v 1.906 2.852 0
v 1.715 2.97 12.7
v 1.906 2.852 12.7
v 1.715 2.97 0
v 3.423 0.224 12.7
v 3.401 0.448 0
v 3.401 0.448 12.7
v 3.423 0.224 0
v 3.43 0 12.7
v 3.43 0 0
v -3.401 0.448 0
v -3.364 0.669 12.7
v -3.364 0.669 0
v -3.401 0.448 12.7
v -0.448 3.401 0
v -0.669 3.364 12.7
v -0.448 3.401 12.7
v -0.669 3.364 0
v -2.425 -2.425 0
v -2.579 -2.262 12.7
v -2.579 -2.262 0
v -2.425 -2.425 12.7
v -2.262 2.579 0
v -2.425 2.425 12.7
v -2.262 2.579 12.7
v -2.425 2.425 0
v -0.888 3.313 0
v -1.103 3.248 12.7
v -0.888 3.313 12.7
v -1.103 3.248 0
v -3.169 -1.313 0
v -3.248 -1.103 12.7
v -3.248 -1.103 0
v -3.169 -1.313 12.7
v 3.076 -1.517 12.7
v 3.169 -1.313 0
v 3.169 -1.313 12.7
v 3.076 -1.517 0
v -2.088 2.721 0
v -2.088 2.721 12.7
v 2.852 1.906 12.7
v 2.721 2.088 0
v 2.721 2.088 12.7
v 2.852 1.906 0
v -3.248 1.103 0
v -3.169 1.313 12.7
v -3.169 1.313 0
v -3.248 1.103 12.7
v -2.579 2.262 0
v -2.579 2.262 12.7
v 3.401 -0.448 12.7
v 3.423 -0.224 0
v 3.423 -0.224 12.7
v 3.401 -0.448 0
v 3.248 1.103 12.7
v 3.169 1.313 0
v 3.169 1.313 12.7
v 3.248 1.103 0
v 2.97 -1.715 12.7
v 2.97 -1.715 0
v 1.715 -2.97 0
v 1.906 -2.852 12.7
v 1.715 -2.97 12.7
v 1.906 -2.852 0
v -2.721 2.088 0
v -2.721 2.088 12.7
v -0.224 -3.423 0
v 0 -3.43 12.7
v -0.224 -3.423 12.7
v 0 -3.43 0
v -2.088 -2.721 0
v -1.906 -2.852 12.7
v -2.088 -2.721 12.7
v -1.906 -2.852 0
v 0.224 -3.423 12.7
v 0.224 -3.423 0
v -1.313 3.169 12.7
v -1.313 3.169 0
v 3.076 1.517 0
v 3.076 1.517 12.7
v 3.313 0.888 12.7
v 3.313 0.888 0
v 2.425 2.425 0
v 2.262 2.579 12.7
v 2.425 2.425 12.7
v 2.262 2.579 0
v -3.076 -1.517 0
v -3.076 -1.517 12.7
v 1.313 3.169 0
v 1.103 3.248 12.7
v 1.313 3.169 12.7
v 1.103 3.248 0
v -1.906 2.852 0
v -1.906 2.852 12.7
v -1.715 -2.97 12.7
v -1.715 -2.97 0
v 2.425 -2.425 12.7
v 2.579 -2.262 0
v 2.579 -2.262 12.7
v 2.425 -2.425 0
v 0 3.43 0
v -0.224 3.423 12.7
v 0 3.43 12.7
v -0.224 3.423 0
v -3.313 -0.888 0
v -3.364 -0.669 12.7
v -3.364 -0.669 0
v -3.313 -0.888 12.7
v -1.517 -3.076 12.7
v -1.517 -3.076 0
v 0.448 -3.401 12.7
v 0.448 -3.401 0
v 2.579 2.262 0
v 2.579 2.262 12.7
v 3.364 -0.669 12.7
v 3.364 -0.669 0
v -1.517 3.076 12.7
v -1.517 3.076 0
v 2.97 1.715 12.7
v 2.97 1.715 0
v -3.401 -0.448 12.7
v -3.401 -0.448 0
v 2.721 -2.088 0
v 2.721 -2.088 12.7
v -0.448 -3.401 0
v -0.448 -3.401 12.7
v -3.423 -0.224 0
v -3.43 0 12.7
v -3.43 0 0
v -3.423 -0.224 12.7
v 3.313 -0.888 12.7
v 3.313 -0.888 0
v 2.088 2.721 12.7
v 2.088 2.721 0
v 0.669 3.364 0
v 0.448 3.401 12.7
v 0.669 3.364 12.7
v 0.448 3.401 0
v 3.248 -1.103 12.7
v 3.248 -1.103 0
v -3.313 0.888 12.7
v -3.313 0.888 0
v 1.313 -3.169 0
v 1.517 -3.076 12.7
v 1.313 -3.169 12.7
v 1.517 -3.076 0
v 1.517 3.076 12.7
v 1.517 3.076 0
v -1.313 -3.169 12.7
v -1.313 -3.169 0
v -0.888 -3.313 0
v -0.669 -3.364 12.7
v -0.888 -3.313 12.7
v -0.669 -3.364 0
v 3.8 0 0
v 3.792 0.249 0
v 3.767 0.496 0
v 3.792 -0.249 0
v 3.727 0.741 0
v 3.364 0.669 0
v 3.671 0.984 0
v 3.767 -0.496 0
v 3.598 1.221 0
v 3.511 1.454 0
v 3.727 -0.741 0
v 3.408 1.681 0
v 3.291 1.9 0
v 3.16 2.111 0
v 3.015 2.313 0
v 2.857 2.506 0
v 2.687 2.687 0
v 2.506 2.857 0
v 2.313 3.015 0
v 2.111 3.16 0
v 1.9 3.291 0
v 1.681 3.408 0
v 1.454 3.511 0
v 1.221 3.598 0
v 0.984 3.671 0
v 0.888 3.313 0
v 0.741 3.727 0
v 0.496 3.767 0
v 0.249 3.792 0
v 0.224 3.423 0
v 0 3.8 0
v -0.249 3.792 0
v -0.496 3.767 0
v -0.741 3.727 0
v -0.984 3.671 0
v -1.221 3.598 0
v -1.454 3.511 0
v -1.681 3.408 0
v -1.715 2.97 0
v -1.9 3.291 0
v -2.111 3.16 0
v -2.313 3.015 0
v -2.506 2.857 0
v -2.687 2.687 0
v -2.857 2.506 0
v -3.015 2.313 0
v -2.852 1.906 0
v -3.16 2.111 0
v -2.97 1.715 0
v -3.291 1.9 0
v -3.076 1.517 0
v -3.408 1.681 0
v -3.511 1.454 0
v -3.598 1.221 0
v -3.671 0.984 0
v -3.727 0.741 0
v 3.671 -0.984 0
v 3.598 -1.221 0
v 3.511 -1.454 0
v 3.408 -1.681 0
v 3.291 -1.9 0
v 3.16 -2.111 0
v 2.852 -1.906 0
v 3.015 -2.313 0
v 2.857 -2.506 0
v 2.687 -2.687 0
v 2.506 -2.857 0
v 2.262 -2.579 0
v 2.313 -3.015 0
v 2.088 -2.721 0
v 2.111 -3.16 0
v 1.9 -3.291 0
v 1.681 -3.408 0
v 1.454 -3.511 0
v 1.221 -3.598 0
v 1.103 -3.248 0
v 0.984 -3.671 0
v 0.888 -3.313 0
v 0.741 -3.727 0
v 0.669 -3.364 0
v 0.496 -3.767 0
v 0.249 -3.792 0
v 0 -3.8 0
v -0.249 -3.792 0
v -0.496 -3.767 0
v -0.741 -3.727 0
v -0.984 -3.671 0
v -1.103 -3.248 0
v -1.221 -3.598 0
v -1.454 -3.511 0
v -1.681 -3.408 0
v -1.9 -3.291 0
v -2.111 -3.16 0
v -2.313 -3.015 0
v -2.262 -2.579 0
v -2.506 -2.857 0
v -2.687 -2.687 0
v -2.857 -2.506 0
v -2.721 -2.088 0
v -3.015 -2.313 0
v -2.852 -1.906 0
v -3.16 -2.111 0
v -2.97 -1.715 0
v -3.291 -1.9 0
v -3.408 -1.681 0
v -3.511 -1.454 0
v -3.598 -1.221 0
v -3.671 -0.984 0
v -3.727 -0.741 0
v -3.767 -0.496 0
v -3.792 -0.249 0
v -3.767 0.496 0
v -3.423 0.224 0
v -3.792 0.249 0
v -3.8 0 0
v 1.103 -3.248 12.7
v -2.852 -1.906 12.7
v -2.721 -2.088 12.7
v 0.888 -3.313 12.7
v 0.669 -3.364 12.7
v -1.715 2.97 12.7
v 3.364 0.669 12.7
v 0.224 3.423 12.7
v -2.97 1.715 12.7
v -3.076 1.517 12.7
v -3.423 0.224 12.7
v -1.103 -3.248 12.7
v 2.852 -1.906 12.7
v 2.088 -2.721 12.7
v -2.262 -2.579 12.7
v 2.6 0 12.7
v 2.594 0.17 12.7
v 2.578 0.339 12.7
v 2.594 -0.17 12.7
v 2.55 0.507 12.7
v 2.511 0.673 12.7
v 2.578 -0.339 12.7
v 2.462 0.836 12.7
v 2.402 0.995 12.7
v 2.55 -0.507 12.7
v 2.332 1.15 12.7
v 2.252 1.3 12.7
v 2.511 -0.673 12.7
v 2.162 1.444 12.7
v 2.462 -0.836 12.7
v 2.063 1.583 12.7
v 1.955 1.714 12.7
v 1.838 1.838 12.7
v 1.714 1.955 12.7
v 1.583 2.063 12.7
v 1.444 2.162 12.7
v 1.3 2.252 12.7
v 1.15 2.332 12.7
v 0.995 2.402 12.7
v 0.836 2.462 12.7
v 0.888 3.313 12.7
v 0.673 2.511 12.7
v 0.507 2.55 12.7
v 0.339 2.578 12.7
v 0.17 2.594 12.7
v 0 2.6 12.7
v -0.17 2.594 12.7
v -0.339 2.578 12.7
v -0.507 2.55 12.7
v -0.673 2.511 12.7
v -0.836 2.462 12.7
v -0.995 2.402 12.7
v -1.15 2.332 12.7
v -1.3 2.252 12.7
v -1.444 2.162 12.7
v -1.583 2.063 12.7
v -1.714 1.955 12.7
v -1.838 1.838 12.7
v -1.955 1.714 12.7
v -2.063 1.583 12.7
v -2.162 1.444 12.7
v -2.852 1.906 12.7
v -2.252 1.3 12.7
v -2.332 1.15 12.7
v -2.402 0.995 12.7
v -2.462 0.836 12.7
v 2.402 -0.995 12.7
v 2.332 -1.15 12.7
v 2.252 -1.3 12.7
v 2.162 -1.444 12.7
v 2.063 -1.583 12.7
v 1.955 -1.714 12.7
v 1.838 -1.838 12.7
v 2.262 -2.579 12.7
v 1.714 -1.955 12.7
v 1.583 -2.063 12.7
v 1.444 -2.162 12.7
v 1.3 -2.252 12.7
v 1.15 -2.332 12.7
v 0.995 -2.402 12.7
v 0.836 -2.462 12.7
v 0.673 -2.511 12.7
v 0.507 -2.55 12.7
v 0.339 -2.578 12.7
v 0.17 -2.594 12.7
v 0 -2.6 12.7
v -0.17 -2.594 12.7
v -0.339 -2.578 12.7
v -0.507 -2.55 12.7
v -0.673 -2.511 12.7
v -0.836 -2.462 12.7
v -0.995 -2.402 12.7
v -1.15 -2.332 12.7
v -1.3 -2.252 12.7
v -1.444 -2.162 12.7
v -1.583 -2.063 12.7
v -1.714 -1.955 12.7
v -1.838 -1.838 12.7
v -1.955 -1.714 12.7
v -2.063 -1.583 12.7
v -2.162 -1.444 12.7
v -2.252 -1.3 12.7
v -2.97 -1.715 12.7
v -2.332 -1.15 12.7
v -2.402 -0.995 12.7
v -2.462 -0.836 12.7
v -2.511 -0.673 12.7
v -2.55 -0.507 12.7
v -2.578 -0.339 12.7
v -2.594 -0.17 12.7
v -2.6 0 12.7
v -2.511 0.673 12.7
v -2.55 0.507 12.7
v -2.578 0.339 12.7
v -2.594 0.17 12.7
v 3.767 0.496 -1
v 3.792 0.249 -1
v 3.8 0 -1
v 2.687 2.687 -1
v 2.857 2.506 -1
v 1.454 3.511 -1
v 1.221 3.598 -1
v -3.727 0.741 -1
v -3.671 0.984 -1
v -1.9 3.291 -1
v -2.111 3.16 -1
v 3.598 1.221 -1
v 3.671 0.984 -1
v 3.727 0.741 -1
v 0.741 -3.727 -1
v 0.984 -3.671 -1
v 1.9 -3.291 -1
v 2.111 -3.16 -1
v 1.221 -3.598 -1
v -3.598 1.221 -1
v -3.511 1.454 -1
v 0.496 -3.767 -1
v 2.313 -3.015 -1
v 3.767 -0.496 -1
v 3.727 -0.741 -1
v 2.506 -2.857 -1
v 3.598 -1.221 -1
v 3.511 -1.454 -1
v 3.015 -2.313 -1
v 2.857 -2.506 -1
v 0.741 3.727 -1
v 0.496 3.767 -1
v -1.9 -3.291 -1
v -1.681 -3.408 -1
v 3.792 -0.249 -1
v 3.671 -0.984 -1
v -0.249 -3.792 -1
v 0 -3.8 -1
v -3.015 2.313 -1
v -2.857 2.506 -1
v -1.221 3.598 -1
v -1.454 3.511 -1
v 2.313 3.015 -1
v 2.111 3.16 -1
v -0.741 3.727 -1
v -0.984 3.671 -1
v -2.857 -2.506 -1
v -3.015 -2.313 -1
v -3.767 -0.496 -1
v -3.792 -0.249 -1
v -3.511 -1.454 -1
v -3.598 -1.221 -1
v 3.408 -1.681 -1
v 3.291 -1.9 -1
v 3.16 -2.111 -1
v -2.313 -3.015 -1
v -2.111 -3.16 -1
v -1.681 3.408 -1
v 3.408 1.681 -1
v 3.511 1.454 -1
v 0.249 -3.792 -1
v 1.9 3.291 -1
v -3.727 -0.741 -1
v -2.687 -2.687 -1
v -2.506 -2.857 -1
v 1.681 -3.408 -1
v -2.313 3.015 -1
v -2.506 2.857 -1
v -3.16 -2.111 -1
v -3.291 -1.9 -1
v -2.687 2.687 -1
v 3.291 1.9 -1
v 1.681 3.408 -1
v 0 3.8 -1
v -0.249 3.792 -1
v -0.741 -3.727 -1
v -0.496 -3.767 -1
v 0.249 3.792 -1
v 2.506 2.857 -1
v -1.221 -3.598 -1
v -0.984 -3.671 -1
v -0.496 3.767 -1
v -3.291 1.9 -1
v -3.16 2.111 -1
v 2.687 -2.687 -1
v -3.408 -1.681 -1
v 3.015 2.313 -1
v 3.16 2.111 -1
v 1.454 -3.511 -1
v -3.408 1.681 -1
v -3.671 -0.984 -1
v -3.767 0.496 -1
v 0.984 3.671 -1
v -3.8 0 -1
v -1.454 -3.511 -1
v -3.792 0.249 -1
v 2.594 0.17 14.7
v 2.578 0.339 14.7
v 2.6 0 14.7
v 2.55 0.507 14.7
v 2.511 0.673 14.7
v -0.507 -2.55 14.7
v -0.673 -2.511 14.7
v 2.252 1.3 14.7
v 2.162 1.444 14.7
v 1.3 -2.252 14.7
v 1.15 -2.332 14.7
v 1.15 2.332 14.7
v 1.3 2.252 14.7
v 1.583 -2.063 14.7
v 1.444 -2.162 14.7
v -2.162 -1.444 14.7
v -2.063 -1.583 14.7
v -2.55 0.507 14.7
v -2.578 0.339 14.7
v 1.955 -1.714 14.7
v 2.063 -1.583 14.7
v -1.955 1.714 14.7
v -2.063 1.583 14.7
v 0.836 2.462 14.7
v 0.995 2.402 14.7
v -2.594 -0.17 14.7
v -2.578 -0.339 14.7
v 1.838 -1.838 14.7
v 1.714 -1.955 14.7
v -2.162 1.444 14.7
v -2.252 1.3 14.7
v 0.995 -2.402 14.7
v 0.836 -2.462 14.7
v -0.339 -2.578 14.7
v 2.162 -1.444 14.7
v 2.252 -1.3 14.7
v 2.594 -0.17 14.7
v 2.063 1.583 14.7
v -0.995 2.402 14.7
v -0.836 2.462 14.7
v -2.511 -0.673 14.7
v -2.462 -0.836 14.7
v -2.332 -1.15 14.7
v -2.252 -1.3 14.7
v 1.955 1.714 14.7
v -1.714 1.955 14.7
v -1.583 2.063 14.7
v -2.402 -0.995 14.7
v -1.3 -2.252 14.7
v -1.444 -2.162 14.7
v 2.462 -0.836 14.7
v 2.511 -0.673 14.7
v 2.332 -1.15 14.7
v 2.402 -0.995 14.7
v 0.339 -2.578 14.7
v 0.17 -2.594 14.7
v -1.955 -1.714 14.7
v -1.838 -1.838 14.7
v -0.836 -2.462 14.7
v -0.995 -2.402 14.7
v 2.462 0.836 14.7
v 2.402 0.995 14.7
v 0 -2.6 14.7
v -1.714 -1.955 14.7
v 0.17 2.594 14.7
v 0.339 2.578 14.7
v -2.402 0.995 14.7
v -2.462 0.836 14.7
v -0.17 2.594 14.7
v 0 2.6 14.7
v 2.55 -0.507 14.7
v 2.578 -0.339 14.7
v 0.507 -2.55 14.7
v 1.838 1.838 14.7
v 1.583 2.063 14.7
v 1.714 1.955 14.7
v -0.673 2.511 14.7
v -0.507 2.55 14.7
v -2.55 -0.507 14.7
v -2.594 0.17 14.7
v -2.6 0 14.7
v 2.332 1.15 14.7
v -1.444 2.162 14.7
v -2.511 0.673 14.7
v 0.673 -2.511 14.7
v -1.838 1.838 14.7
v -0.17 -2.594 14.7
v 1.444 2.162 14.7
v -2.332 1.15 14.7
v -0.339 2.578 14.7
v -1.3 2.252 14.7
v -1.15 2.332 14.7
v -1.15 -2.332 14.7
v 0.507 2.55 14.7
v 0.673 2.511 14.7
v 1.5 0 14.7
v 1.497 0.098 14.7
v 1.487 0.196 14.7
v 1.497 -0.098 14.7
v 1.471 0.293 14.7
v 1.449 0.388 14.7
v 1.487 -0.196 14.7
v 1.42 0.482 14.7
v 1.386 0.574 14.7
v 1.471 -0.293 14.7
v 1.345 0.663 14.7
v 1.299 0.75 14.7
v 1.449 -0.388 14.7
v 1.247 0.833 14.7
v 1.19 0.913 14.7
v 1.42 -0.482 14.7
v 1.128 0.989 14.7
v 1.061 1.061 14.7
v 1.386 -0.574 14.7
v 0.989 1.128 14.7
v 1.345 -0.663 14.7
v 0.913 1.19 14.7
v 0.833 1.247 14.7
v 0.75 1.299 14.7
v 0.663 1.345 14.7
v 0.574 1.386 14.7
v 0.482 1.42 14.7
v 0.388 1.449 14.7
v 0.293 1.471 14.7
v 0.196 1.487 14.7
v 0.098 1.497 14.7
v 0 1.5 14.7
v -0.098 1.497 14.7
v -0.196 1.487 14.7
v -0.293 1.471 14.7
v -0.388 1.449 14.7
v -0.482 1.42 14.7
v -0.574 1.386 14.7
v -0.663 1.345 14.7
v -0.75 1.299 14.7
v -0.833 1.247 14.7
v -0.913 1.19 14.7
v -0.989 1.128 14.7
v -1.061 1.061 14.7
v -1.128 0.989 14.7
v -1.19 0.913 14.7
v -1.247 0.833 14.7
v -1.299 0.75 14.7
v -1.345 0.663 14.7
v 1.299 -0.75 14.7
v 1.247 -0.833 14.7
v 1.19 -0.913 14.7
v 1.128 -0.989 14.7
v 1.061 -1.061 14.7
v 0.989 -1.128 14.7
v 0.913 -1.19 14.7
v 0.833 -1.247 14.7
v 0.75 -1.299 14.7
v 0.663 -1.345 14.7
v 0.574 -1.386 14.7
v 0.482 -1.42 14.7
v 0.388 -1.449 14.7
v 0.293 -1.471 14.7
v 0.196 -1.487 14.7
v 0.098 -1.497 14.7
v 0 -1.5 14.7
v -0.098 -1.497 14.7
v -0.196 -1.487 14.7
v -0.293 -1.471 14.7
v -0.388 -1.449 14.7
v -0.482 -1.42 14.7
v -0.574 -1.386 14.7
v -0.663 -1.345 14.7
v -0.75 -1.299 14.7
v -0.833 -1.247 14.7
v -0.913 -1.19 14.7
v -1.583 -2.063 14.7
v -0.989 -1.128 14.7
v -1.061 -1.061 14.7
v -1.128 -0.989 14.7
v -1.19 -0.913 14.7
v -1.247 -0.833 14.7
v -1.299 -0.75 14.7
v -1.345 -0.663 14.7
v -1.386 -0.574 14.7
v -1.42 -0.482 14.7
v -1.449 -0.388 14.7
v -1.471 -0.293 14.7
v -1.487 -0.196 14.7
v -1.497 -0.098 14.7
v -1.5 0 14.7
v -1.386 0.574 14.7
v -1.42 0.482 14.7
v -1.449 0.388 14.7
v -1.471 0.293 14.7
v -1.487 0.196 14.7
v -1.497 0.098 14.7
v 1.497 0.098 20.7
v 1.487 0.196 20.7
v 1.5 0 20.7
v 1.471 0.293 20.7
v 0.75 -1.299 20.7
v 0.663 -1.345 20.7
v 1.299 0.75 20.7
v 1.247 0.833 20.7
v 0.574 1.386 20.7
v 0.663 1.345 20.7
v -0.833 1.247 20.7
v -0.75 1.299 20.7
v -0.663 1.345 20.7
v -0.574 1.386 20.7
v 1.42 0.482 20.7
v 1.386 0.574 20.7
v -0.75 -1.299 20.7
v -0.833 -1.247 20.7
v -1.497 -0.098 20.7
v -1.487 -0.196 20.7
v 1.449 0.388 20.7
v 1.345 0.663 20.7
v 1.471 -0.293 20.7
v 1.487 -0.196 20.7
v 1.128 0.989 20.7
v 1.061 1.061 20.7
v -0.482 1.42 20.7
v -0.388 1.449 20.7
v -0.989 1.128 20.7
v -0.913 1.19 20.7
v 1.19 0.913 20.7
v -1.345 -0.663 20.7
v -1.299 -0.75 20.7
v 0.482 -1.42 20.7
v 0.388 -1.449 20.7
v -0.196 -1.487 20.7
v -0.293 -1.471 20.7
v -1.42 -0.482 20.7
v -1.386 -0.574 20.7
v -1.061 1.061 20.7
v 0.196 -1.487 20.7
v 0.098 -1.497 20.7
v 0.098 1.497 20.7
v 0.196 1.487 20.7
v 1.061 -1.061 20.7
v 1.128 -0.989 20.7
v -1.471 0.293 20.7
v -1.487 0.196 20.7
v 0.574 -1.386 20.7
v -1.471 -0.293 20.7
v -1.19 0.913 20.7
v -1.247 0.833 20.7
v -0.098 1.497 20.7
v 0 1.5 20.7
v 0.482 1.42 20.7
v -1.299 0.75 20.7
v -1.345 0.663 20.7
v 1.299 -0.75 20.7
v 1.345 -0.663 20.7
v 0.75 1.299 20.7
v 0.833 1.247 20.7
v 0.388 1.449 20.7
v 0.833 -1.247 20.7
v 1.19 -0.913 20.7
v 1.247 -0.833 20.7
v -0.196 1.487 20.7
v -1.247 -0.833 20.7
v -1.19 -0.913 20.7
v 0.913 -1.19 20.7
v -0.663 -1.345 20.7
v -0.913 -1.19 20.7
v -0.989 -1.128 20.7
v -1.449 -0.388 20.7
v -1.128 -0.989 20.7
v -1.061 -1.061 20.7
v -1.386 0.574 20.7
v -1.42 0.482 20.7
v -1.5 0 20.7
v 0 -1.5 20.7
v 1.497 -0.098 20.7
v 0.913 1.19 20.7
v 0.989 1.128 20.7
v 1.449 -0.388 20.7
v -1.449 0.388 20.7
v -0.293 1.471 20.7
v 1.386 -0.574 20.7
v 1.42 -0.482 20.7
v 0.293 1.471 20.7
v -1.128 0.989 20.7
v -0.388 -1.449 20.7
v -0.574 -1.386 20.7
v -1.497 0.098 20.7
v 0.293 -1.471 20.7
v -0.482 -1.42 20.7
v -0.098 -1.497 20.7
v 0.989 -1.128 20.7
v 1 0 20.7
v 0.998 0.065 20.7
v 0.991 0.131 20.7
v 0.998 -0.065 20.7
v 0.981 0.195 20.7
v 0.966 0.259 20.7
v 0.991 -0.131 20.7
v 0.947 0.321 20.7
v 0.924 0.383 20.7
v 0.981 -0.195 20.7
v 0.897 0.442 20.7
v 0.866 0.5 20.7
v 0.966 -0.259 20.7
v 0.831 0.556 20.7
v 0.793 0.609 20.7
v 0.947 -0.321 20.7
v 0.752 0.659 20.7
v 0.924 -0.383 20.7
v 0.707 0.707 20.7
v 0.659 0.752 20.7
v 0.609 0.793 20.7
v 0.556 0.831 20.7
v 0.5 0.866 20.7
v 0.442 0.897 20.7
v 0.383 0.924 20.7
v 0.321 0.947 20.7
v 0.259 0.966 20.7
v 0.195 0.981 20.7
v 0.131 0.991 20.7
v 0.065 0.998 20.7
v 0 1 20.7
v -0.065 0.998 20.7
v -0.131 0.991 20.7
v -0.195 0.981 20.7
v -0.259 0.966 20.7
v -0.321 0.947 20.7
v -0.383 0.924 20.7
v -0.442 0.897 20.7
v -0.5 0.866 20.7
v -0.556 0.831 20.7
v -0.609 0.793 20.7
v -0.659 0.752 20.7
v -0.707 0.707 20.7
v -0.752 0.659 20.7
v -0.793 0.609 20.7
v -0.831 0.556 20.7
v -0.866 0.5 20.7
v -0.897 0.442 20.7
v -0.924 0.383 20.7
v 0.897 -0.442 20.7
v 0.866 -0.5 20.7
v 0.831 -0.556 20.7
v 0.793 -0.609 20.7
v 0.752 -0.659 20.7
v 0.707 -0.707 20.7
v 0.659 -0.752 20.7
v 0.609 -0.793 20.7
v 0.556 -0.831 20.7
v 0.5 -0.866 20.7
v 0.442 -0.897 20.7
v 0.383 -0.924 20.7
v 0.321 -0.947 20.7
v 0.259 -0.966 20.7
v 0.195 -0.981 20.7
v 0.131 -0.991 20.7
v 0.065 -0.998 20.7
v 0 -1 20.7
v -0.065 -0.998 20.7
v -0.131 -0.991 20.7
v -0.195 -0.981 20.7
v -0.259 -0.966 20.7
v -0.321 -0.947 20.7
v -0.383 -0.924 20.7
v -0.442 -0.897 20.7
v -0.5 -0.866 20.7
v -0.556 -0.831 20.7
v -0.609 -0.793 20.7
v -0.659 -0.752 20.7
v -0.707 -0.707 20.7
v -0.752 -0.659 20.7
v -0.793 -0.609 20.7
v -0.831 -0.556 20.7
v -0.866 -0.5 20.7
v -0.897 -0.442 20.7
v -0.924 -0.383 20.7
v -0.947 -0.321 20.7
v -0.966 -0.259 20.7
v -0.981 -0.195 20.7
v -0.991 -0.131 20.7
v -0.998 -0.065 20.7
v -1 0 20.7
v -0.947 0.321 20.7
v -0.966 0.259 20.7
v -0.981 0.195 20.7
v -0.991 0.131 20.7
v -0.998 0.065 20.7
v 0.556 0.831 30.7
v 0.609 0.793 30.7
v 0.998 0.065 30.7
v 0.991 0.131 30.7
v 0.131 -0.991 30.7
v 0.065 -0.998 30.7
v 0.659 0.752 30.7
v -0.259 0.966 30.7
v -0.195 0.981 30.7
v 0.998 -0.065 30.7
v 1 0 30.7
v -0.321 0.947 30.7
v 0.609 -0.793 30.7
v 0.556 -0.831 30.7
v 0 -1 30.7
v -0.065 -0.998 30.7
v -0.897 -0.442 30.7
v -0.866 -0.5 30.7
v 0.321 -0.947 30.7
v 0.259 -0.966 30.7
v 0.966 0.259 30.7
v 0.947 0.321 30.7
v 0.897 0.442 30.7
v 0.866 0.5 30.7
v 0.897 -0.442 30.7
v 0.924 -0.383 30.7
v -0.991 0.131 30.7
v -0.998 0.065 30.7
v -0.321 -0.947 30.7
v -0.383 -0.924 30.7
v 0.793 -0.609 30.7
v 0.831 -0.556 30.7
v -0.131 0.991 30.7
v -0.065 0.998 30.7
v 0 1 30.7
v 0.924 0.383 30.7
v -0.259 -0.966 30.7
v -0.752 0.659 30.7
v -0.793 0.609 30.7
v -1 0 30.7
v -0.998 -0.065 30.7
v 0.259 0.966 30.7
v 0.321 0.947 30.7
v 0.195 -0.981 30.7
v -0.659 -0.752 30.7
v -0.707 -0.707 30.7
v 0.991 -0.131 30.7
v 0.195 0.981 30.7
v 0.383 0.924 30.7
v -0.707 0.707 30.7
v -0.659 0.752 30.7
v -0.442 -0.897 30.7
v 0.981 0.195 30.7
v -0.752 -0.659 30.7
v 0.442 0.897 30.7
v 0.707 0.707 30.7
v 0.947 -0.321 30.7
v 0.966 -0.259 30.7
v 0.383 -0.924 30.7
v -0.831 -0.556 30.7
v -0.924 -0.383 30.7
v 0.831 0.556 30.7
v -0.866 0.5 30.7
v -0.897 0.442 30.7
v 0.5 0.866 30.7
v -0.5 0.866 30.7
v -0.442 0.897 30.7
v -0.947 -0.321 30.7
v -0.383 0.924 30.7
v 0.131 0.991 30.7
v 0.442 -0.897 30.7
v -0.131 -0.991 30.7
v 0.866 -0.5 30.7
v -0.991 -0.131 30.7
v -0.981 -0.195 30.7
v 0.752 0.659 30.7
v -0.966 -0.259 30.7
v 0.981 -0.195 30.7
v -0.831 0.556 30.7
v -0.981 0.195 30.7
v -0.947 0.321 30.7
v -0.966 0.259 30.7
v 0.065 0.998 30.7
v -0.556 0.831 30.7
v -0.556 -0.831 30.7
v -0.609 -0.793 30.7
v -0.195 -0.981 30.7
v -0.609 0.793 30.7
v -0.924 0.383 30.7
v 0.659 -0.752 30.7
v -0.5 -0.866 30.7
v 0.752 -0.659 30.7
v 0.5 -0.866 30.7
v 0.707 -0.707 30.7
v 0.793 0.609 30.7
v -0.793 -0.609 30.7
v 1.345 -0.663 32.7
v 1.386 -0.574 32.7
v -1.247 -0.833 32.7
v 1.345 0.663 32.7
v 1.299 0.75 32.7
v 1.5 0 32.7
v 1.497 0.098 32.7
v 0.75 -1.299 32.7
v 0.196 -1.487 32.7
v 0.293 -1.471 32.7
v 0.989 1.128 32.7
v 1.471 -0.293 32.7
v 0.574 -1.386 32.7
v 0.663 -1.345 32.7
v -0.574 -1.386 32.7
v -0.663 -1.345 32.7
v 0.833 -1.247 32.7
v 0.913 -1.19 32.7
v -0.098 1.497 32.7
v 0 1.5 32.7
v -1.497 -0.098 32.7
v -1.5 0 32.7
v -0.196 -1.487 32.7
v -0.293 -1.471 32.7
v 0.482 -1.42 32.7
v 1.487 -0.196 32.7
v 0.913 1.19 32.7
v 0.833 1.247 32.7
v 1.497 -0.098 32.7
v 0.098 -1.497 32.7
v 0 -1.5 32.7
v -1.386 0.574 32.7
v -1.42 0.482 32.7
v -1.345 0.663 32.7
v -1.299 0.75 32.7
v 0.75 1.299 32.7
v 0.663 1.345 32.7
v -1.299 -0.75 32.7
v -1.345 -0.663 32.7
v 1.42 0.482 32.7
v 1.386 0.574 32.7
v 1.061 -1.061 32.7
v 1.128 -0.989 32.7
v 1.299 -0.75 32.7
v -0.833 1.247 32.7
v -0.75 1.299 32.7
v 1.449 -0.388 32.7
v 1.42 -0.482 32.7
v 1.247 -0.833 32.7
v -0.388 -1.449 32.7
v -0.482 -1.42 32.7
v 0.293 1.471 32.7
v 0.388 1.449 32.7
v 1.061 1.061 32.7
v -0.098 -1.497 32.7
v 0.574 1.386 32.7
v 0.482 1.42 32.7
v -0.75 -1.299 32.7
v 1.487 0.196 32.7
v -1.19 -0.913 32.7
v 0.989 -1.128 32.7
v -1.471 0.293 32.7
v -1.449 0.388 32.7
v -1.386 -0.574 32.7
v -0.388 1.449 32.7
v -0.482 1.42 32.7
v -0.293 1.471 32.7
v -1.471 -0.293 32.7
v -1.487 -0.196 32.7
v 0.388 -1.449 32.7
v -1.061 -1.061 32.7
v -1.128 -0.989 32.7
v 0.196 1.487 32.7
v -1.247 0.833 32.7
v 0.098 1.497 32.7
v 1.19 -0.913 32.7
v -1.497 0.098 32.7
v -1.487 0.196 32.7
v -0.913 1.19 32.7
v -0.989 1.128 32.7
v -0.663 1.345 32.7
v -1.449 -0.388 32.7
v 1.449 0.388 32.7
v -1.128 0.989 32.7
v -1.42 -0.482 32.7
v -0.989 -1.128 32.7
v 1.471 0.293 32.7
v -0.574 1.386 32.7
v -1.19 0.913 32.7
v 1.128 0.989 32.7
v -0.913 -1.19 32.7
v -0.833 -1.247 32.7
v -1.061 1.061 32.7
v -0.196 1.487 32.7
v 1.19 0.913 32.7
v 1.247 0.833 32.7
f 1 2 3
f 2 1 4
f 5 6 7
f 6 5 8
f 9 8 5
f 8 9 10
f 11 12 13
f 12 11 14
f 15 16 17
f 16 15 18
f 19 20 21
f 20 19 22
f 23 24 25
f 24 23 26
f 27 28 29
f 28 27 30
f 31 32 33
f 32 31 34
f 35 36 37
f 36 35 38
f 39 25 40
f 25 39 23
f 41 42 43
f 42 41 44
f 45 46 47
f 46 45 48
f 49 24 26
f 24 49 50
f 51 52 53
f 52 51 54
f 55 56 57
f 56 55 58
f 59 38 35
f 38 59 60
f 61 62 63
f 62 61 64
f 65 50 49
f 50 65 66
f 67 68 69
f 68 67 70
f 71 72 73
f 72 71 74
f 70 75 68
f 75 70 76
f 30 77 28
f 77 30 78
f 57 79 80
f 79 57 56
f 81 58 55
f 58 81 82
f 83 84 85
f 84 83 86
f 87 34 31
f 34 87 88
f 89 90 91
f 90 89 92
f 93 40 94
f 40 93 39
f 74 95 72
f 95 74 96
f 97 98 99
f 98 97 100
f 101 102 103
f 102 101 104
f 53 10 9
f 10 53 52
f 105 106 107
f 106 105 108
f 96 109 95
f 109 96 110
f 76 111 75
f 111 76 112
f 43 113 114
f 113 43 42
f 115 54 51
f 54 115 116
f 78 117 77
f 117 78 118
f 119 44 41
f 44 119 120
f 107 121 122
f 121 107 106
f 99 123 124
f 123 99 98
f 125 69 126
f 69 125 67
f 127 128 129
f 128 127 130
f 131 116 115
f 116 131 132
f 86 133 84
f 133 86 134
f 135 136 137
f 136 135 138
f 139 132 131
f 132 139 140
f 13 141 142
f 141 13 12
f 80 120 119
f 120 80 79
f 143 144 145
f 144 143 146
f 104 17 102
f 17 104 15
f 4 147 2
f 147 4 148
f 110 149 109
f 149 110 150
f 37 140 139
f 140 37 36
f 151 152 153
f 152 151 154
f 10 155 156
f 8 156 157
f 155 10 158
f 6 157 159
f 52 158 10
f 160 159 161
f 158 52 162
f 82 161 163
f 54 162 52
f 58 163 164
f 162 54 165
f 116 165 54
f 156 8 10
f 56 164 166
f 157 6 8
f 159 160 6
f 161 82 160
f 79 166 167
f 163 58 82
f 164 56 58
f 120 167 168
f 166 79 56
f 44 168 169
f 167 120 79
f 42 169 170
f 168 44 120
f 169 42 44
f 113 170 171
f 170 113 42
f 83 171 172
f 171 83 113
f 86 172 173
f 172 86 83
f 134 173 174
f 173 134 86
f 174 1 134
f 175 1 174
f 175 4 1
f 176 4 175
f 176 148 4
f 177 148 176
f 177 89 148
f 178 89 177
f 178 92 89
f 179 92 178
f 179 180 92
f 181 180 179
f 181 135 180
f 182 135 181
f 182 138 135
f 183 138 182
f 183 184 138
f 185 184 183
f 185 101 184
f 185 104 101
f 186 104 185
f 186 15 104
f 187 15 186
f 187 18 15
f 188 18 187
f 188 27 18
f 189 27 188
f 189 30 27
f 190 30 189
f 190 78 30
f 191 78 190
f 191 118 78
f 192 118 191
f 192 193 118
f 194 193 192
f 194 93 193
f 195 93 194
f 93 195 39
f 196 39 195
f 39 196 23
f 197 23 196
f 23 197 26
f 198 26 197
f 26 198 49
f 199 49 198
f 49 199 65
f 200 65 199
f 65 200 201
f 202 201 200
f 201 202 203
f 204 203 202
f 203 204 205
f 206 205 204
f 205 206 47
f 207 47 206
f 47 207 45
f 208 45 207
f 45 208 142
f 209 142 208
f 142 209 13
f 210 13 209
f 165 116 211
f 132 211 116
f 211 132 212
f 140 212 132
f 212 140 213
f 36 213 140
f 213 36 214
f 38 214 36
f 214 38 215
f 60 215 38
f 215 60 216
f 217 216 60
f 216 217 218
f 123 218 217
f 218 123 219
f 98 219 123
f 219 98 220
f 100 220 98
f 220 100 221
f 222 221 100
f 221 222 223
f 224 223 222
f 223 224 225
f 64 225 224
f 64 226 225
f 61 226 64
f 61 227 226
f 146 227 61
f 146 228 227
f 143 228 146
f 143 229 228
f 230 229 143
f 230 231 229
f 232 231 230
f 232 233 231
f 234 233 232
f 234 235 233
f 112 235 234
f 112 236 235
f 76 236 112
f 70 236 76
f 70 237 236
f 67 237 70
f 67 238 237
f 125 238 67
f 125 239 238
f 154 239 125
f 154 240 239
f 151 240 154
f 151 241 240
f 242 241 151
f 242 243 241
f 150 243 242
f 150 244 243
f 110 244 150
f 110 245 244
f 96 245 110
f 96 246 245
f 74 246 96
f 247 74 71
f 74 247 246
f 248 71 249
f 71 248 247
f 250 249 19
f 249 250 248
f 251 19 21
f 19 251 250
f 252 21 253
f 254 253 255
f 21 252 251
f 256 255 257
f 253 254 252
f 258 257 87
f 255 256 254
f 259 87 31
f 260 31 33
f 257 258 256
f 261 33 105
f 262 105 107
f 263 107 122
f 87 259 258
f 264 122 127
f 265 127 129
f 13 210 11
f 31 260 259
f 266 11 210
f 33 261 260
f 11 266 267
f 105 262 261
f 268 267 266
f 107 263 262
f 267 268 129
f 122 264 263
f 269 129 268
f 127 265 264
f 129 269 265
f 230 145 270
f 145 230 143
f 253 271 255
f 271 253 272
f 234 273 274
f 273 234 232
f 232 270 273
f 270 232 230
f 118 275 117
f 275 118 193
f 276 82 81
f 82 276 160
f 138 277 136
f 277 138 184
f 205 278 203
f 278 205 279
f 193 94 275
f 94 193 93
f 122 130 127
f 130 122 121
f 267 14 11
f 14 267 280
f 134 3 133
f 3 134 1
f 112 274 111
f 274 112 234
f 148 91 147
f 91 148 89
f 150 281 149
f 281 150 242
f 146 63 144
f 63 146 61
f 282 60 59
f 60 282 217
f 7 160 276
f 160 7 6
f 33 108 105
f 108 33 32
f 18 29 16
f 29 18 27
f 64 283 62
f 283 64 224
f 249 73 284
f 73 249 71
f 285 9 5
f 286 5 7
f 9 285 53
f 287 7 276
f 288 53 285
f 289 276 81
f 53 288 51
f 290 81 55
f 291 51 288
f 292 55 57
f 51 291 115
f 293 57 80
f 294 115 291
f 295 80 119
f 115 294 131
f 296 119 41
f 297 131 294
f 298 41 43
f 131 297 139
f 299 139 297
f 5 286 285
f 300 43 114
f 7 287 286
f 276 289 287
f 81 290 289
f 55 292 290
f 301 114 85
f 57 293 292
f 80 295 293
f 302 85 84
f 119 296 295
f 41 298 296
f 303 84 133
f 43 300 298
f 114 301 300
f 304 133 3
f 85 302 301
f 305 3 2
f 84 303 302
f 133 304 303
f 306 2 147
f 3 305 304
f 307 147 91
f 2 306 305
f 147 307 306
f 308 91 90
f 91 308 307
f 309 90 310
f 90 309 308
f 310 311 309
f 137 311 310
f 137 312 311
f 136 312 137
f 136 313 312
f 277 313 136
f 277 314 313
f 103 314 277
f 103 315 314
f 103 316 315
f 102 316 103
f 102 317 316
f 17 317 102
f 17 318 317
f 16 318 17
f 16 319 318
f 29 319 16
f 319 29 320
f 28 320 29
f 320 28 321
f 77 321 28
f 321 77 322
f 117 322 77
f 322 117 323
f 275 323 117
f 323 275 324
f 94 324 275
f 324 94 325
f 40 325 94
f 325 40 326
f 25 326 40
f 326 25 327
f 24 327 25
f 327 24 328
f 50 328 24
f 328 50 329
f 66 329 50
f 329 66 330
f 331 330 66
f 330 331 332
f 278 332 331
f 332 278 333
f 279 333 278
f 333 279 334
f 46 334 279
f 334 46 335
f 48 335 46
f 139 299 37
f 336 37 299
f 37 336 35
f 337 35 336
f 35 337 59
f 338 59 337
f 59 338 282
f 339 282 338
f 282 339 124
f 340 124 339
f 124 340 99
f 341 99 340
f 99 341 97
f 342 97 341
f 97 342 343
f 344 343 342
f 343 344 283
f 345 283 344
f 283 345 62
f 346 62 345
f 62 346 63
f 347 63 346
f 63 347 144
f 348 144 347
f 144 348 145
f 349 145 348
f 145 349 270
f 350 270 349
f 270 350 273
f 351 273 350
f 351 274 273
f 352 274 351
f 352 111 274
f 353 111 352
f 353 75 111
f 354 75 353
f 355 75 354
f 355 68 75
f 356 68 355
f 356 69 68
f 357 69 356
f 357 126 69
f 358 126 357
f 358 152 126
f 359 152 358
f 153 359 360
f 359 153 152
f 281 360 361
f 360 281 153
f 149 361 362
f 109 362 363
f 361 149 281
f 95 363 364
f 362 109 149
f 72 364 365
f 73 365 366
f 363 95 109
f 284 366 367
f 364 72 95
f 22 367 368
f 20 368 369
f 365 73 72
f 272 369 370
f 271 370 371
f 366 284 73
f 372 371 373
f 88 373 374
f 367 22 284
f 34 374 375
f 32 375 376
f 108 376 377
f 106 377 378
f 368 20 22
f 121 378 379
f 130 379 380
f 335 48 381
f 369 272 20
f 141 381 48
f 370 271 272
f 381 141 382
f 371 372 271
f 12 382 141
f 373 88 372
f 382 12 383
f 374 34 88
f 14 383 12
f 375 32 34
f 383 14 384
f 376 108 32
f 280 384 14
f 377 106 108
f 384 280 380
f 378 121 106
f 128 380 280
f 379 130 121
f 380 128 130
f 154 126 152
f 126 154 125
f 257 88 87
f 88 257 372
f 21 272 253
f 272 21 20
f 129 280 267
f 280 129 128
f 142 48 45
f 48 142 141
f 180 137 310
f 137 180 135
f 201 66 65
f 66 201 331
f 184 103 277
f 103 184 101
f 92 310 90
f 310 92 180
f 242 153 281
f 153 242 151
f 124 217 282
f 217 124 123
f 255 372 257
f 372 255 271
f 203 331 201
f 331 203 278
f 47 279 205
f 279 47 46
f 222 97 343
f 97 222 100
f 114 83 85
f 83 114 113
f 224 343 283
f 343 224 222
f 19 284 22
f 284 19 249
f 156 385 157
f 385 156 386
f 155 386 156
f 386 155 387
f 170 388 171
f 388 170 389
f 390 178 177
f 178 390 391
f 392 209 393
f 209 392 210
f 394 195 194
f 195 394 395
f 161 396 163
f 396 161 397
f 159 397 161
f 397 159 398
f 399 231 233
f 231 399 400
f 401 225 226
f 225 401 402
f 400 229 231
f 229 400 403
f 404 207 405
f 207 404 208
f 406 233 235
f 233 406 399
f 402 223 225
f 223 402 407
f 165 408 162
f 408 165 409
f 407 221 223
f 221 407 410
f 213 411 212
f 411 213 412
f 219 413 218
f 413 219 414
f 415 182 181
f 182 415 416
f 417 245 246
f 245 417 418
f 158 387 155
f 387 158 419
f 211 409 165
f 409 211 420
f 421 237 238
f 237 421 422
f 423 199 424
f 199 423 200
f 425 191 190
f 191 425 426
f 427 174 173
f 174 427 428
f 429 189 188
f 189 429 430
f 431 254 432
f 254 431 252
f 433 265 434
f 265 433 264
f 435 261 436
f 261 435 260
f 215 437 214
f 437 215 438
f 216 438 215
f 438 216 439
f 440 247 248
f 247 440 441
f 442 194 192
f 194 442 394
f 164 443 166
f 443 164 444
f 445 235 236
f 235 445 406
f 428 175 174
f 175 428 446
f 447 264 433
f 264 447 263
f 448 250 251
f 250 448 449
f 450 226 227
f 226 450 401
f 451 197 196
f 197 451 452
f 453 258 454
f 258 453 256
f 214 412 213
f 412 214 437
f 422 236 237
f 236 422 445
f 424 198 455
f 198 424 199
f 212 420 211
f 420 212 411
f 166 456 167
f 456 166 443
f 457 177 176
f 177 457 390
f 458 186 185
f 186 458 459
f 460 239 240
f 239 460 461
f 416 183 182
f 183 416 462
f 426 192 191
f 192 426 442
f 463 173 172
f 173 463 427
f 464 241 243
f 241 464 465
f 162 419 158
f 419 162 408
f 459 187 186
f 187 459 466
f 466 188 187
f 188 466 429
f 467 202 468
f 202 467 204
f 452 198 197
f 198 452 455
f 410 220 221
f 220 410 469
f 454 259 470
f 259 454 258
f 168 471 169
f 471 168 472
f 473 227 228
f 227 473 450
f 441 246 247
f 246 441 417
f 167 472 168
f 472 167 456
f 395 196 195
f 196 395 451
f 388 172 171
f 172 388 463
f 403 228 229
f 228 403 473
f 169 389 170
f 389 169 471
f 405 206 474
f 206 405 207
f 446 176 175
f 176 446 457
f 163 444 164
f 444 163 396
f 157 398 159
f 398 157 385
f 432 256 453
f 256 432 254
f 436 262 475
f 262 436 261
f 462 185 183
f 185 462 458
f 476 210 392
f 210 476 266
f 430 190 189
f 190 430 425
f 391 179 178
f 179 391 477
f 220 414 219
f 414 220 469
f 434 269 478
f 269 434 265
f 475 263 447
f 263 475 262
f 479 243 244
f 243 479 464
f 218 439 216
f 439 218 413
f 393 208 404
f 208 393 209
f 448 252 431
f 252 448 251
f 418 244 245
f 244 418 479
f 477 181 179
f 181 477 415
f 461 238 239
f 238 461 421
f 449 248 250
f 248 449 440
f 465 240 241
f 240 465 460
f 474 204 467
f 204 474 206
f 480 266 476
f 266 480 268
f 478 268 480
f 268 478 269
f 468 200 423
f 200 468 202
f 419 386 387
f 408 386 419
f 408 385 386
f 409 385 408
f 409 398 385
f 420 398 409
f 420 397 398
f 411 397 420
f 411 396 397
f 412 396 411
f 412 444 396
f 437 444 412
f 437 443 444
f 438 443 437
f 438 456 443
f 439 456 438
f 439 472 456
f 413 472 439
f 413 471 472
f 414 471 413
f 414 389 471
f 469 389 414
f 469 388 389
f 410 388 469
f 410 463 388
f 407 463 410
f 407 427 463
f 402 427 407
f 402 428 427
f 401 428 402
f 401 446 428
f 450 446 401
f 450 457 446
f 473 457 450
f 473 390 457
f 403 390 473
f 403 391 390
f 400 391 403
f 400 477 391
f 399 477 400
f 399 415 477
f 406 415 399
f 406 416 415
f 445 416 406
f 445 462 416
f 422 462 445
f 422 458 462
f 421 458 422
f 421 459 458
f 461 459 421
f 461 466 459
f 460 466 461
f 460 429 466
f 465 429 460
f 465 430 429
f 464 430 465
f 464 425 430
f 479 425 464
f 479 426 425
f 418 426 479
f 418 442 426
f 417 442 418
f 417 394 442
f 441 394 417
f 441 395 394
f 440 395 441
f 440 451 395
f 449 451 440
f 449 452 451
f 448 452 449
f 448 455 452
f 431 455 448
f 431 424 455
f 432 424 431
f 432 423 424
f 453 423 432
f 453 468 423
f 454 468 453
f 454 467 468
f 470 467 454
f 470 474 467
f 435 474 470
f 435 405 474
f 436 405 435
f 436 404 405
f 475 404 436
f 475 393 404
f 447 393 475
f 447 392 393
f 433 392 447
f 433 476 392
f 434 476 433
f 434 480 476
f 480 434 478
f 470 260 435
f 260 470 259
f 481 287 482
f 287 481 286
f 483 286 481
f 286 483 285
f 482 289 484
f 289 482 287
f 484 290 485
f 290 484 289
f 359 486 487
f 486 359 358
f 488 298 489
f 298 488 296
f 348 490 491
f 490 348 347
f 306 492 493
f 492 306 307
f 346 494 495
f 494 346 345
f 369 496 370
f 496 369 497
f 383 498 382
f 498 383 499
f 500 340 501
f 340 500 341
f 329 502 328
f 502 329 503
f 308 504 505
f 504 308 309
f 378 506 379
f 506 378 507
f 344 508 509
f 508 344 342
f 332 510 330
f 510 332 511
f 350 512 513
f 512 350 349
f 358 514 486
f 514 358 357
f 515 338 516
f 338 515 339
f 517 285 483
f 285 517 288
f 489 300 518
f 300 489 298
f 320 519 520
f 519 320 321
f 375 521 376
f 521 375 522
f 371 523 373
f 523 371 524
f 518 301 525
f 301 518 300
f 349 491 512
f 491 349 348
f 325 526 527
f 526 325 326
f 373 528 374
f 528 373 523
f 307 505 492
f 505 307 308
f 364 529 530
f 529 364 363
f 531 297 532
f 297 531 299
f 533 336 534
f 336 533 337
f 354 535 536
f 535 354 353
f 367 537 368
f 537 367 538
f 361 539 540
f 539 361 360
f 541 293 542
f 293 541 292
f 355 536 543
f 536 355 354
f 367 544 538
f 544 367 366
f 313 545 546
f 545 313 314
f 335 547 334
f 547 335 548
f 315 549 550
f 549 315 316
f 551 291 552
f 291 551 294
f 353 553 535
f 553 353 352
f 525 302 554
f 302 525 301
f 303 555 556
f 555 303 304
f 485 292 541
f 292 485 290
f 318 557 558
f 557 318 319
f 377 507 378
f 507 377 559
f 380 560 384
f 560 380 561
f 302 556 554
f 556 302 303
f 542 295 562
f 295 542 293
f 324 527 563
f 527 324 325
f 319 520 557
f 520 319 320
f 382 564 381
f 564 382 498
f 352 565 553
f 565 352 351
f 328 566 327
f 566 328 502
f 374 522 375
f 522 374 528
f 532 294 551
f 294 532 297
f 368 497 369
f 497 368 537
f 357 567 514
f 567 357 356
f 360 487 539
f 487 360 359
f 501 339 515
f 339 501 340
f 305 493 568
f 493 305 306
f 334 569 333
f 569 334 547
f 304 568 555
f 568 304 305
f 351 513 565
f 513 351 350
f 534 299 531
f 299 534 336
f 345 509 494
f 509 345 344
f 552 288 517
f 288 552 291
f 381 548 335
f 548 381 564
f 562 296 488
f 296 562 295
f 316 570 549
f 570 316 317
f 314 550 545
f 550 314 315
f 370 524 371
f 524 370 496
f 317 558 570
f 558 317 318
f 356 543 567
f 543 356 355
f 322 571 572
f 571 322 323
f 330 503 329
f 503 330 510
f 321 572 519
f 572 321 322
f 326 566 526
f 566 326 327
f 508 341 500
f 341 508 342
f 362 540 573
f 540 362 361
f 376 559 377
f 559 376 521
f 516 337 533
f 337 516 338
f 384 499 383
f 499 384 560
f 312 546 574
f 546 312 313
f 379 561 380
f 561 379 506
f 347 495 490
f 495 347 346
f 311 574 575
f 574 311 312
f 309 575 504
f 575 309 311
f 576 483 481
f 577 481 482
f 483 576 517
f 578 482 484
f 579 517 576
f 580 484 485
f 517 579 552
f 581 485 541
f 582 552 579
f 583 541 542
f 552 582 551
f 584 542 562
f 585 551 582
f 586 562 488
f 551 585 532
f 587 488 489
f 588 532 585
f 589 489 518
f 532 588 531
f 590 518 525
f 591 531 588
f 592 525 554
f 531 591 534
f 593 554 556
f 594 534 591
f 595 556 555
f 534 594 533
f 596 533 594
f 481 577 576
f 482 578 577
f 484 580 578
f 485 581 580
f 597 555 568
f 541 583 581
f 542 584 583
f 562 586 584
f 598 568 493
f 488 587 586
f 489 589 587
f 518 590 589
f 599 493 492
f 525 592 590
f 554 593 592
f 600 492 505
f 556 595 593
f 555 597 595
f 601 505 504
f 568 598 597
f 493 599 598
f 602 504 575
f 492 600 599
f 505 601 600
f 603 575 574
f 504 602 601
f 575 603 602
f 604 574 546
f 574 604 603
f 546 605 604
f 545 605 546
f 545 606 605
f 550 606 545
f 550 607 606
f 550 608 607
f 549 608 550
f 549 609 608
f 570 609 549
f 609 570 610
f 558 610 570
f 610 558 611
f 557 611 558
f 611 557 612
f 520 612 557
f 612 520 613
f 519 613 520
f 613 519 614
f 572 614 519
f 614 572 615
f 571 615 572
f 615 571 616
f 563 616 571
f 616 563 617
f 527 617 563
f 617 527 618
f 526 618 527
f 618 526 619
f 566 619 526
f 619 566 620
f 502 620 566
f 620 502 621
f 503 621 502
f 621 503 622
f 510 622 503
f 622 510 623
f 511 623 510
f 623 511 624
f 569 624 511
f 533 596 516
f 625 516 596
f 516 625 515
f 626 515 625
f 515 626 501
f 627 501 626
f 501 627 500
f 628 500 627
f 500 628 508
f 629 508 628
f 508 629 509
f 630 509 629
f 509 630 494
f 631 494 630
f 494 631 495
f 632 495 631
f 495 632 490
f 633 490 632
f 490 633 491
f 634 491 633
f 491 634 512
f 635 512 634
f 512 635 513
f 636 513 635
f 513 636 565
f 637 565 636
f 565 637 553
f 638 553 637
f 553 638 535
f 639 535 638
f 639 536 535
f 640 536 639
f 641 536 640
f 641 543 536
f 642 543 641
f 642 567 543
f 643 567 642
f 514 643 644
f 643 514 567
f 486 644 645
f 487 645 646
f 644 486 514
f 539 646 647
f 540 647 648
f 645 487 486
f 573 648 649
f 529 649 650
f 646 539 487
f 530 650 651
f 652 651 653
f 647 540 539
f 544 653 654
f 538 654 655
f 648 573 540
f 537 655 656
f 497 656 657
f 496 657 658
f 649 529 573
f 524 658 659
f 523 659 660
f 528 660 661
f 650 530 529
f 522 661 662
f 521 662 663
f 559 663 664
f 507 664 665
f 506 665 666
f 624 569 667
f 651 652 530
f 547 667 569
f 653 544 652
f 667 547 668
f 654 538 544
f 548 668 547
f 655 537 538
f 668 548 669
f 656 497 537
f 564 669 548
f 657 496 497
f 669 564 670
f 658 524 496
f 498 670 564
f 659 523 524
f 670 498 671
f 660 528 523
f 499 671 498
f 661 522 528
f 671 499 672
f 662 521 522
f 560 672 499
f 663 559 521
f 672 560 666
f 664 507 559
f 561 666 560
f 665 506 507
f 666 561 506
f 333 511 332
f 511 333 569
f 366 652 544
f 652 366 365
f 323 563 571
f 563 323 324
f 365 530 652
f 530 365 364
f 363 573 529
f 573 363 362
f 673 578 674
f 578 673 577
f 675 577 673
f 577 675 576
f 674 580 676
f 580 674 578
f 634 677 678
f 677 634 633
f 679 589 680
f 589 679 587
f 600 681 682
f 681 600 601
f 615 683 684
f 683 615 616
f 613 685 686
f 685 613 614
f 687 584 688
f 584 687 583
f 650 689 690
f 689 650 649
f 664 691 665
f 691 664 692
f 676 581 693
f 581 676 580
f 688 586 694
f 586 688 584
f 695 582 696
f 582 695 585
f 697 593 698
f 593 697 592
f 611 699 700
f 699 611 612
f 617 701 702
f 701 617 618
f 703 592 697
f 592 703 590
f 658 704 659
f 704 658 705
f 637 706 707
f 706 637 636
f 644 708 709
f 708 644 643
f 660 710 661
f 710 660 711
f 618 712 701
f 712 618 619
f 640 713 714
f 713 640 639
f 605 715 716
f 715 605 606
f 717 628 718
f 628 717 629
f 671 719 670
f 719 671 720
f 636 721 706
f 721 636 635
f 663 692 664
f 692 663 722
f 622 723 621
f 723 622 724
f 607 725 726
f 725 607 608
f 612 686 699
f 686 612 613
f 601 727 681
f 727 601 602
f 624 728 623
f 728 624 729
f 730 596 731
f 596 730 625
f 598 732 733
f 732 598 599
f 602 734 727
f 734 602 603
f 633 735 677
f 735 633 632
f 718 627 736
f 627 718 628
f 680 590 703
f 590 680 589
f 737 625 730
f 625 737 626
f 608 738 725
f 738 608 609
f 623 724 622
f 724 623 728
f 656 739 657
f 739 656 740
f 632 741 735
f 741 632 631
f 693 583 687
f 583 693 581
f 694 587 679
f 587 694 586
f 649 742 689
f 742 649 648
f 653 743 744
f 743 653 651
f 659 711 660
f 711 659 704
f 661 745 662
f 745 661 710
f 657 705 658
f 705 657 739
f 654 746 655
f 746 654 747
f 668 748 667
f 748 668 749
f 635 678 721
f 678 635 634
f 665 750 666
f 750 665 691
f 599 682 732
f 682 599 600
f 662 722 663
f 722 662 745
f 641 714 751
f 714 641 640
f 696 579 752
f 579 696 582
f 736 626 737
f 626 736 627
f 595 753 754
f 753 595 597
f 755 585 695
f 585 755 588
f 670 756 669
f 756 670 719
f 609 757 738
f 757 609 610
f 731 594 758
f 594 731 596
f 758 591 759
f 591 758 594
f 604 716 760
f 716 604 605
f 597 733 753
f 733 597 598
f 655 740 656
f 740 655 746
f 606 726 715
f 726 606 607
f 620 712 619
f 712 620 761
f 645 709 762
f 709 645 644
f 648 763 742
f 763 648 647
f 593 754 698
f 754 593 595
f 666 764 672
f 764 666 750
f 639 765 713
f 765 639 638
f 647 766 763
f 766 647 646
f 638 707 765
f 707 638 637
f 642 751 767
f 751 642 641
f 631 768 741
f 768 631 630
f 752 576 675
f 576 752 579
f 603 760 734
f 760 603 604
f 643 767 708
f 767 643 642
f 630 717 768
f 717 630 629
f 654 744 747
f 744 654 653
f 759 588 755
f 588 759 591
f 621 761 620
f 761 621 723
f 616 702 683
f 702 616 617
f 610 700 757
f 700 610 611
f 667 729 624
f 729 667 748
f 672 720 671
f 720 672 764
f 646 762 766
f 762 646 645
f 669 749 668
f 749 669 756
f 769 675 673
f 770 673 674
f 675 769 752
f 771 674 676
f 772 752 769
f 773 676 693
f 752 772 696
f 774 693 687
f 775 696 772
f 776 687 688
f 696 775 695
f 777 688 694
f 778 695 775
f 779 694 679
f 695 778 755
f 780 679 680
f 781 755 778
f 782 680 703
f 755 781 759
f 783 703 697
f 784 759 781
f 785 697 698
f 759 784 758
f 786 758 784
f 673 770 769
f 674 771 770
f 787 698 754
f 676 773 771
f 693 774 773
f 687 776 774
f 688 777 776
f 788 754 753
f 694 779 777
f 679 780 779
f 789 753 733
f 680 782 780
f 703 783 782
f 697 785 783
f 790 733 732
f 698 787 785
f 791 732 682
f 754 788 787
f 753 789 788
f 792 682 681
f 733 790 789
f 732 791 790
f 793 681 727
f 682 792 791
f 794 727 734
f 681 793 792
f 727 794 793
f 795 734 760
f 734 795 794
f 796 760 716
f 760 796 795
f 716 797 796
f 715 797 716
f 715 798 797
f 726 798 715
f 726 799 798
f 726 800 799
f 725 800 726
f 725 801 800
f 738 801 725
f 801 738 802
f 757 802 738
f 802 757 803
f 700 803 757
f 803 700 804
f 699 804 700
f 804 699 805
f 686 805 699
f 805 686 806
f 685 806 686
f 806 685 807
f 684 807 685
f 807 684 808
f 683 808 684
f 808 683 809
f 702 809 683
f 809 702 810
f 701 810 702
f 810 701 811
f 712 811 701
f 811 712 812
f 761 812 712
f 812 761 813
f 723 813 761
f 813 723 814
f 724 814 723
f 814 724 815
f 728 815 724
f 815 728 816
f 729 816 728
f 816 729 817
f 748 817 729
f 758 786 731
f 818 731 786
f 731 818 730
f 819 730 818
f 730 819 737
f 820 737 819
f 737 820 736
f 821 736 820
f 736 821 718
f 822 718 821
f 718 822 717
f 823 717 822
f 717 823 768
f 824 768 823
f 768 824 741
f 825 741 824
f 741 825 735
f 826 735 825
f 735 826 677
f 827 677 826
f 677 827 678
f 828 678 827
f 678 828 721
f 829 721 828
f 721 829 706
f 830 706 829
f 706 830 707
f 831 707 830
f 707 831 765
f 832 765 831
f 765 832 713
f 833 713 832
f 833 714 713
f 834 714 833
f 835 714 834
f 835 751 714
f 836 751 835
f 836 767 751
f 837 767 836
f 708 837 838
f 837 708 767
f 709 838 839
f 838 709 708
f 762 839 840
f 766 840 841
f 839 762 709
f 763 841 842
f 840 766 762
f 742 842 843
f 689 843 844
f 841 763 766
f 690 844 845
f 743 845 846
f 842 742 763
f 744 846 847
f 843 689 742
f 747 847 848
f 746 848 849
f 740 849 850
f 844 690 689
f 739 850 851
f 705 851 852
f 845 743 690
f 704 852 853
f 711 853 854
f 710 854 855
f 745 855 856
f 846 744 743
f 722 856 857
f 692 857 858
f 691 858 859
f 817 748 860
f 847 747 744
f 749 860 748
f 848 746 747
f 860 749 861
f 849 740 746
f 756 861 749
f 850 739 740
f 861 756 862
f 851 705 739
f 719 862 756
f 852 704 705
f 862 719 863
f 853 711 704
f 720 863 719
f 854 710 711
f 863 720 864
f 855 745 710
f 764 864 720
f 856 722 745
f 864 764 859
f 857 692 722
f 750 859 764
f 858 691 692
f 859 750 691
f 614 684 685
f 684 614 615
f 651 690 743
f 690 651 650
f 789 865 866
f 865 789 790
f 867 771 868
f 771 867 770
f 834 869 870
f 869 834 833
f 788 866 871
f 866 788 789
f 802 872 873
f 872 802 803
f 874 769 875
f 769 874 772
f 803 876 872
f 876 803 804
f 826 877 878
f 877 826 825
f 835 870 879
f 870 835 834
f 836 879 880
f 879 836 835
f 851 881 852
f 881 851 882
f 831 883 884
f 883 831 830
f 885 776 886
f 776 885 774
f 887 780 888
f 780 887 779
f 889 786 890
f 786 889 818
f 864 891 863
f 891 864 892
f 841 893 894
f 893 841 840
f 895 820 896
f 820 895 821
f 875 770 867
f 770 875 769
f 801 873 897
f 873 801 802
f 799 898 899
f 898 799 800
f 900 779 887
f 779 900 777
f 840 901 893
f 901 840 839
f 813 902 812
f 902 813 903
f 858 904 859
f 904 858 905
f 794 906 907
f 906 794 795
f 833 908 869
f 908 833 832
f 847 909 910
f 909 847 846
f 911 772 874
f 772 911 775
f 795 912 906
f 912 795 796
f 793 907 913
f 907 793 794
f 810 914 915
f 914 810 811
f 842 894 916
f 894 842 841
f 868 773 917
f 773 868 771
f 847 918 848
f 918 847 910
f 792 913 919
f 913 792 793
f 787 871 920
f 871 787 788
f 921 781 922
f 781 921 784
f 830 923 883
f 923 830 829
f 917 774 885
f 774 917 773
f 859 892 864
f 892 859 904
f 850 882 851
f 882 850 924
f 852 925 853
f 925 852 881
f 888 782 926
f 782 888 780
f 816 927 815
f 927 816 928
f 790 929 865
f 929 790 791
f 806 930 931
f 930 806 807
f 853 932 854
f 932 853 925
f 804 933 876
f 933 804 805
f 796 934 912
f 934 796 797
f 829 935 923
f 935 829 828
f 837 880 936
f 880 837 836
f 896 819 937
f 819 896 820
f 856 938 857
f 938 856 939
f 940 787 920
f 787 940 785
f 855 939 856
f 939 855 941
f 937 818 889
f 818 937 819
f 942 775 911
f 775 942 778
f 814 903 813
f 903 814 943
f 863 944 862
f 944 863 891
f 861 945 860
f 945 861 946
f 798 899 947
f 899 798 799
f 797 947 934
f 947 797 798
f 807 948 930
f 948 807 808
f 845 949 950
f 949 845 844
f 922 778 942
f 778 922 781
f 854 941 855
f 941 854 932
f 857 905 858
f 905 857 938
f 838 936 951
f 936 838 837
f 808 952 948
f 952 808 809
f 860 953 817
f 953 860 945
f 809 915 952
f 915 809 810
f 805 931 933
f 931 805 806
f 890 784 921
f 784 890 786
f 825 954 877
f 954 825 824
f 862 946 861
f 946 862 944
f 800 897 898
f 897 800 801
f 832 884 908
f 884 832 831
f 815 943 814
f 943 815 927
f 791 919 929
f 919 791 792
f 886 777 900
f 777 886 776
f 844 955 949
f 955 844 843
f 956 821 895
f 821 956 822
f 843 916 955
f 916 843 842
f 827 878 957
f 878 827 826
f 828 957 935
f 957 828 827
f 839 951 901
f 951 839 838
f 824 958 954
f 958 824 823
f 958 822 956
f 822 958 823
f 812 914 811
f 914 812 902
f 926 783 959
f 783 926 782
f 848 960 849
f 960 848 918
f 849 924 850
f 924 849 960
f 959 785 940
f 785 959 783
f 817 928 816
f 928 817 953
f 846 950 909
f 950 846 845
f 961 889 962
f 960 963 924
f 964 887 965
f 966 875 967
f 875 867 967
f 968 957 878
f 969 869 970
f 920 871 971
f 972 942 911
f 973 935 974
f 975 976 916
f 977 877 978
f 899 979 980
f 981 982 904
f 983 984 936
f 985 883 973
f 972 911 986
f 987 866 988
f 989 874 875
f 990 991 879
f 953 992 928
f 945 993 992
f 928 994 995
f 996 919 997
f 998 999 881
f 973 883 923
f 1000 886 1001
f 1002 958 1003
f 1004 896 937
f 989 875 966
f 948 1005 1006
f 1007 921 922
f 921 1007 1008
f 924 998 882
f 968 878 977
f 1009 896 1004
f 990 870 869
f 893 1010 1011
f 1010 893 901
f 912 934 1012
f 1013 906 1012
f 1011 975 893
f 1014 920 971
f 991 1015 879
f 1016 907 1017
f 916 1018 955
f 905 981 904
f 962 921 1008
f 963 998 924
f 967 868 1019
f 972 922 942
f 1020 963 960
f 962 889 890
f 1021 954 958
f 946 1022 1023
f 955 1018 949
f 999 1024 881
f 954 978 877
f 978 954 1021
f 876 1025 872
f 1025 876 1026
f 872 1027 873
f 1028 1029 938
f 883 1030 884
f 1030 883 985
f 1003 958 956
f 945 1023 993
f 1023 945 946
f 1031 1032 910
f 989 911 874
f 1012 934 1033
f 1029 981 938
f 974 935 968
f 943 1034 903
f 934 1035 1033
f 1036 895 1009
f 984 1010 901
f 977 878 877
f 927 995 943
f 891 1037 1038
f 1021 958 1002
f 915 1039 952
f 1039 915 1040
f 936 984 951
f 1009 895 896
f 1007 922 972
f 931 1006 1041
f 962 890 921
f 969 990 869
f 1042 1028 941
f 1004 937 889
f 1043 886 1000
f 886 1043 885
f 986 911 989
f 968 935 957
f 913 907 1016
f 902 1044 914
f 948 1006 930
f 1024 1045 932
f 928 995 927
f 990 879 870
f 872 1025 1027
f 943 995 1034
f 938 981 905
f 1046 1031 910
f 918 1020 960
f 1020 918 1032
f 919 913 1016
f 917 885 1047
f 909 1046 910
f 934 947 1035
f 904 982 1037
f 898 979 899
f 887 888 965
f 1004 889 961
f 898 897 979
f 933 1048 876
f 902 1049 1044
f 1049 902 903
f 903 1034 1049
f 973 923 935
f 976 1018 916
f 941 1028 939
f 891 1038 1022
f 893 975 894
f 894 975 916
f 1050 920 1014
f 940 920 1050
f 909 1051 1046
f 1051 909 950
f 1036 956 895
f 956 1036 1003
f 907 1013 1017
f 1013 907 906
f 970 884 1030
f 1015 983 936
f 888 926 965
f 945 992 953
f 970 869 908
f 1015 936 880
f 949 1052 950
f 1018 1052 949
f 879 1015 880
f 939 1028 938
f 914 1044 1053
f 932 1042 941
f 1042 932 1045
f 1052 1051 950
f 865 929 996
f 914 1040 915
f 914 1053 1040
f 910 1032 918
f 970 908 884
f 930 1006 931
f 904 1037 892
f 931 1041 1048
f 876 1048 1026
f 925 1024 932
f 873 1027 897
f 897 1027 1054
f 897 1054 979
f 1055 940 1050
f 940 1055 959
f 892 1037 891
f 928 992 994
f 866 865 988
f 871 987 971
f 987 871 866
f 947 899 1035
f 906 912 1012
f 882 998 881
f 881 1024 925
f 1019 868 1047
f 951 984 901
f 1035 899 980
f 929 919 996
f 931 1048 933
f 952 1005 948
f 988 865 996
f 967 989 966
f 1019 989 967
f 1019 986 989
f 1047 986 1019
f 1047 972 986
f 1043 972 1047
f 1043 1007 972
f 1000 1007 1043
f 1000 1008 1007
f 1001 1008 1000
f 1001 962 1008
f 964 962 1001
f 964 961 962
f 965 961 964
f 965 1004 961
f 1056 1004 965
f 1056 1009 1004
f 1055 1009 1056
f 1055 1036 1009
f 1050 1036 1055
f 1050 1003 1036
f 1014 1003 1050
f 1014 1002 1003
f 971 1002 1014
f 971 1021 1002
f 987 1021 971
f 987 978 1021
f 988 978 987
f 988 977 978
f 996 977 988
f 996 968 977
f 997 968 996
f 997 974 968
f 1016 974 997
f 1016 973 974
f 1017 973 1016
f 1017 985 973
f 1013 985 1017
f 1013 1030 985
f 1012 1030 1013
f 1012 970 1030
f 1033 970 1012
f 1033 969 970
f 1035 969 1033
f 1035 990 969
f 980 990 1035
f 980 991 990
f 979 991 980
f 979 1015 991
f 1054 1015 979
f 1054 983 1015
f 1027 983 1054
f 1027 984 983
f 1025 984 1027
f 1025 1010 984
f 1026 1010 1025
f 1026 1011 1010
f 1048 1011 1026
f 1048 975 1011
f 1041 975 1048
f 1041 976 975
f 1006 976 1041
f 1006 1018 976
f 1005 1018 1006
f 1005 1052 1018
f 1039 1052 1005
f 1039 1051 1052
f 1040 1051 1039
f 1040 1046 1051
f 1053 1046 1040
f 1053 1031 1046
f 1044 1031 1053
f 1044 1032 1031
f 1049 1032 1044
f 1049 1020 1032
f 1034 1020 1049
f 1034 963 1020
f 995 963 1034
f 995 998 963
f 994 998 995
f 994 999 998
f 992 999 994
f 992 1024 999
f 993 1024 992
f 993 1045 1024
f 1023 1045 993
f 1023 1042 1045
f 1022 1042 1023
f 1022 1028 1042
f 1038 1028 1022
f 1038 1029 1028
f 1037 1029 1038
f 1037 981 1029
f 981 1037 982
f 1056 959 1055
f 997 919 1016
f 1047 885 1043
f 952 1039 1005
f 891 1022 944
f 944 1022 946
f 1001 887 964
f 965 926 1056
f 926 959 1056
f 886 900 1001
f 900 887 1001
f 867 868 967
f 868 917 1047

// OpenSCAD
$fn = 96;

body_d = 6.86;
body_h = 12.7;

stem_d = 3.0;
stem_h = 6.0;

bushing_d = 5.2;
bushing_h = 2.0;

lever_d = 2.0;
lever_h = 10.0;

tip_d = 3.0;
tip_h = 2.0;

base_flange_d = 7.6;
base_flange_h = 1.0;

module toggle_switch() {
    union() {
        // Main cylindrical body
        cylinder(d = body_d, h = body_h);

        // Small base flange
        translate([0, 0, -base_flange_h])
            cylinder(d = base_flange_d, h = base_flange_h);

        // Threaded/bushing section on top of body
        translate([0, 0, body_h])
            cylinder(d = bushing_d, h = bushing_h);

        // Stem above bushing
        translate([0, 0, body_h + bushing_h])
            cylinder(d = stem_d, h = stem_h);

        // Lever (toggle) above stem
        translate([0, 0, body_h + bushing_h + stem_h])
            cylinder(d = lever_d, h = lever_h);

        // Rounded-ish tip
        translate([0, 0, body_h + bushing_h + stem_h + lever_h])
            cylinder(d1 = lever_d, d2 = tip_d, h = tip_h);
    }
}

toggle_switch();
